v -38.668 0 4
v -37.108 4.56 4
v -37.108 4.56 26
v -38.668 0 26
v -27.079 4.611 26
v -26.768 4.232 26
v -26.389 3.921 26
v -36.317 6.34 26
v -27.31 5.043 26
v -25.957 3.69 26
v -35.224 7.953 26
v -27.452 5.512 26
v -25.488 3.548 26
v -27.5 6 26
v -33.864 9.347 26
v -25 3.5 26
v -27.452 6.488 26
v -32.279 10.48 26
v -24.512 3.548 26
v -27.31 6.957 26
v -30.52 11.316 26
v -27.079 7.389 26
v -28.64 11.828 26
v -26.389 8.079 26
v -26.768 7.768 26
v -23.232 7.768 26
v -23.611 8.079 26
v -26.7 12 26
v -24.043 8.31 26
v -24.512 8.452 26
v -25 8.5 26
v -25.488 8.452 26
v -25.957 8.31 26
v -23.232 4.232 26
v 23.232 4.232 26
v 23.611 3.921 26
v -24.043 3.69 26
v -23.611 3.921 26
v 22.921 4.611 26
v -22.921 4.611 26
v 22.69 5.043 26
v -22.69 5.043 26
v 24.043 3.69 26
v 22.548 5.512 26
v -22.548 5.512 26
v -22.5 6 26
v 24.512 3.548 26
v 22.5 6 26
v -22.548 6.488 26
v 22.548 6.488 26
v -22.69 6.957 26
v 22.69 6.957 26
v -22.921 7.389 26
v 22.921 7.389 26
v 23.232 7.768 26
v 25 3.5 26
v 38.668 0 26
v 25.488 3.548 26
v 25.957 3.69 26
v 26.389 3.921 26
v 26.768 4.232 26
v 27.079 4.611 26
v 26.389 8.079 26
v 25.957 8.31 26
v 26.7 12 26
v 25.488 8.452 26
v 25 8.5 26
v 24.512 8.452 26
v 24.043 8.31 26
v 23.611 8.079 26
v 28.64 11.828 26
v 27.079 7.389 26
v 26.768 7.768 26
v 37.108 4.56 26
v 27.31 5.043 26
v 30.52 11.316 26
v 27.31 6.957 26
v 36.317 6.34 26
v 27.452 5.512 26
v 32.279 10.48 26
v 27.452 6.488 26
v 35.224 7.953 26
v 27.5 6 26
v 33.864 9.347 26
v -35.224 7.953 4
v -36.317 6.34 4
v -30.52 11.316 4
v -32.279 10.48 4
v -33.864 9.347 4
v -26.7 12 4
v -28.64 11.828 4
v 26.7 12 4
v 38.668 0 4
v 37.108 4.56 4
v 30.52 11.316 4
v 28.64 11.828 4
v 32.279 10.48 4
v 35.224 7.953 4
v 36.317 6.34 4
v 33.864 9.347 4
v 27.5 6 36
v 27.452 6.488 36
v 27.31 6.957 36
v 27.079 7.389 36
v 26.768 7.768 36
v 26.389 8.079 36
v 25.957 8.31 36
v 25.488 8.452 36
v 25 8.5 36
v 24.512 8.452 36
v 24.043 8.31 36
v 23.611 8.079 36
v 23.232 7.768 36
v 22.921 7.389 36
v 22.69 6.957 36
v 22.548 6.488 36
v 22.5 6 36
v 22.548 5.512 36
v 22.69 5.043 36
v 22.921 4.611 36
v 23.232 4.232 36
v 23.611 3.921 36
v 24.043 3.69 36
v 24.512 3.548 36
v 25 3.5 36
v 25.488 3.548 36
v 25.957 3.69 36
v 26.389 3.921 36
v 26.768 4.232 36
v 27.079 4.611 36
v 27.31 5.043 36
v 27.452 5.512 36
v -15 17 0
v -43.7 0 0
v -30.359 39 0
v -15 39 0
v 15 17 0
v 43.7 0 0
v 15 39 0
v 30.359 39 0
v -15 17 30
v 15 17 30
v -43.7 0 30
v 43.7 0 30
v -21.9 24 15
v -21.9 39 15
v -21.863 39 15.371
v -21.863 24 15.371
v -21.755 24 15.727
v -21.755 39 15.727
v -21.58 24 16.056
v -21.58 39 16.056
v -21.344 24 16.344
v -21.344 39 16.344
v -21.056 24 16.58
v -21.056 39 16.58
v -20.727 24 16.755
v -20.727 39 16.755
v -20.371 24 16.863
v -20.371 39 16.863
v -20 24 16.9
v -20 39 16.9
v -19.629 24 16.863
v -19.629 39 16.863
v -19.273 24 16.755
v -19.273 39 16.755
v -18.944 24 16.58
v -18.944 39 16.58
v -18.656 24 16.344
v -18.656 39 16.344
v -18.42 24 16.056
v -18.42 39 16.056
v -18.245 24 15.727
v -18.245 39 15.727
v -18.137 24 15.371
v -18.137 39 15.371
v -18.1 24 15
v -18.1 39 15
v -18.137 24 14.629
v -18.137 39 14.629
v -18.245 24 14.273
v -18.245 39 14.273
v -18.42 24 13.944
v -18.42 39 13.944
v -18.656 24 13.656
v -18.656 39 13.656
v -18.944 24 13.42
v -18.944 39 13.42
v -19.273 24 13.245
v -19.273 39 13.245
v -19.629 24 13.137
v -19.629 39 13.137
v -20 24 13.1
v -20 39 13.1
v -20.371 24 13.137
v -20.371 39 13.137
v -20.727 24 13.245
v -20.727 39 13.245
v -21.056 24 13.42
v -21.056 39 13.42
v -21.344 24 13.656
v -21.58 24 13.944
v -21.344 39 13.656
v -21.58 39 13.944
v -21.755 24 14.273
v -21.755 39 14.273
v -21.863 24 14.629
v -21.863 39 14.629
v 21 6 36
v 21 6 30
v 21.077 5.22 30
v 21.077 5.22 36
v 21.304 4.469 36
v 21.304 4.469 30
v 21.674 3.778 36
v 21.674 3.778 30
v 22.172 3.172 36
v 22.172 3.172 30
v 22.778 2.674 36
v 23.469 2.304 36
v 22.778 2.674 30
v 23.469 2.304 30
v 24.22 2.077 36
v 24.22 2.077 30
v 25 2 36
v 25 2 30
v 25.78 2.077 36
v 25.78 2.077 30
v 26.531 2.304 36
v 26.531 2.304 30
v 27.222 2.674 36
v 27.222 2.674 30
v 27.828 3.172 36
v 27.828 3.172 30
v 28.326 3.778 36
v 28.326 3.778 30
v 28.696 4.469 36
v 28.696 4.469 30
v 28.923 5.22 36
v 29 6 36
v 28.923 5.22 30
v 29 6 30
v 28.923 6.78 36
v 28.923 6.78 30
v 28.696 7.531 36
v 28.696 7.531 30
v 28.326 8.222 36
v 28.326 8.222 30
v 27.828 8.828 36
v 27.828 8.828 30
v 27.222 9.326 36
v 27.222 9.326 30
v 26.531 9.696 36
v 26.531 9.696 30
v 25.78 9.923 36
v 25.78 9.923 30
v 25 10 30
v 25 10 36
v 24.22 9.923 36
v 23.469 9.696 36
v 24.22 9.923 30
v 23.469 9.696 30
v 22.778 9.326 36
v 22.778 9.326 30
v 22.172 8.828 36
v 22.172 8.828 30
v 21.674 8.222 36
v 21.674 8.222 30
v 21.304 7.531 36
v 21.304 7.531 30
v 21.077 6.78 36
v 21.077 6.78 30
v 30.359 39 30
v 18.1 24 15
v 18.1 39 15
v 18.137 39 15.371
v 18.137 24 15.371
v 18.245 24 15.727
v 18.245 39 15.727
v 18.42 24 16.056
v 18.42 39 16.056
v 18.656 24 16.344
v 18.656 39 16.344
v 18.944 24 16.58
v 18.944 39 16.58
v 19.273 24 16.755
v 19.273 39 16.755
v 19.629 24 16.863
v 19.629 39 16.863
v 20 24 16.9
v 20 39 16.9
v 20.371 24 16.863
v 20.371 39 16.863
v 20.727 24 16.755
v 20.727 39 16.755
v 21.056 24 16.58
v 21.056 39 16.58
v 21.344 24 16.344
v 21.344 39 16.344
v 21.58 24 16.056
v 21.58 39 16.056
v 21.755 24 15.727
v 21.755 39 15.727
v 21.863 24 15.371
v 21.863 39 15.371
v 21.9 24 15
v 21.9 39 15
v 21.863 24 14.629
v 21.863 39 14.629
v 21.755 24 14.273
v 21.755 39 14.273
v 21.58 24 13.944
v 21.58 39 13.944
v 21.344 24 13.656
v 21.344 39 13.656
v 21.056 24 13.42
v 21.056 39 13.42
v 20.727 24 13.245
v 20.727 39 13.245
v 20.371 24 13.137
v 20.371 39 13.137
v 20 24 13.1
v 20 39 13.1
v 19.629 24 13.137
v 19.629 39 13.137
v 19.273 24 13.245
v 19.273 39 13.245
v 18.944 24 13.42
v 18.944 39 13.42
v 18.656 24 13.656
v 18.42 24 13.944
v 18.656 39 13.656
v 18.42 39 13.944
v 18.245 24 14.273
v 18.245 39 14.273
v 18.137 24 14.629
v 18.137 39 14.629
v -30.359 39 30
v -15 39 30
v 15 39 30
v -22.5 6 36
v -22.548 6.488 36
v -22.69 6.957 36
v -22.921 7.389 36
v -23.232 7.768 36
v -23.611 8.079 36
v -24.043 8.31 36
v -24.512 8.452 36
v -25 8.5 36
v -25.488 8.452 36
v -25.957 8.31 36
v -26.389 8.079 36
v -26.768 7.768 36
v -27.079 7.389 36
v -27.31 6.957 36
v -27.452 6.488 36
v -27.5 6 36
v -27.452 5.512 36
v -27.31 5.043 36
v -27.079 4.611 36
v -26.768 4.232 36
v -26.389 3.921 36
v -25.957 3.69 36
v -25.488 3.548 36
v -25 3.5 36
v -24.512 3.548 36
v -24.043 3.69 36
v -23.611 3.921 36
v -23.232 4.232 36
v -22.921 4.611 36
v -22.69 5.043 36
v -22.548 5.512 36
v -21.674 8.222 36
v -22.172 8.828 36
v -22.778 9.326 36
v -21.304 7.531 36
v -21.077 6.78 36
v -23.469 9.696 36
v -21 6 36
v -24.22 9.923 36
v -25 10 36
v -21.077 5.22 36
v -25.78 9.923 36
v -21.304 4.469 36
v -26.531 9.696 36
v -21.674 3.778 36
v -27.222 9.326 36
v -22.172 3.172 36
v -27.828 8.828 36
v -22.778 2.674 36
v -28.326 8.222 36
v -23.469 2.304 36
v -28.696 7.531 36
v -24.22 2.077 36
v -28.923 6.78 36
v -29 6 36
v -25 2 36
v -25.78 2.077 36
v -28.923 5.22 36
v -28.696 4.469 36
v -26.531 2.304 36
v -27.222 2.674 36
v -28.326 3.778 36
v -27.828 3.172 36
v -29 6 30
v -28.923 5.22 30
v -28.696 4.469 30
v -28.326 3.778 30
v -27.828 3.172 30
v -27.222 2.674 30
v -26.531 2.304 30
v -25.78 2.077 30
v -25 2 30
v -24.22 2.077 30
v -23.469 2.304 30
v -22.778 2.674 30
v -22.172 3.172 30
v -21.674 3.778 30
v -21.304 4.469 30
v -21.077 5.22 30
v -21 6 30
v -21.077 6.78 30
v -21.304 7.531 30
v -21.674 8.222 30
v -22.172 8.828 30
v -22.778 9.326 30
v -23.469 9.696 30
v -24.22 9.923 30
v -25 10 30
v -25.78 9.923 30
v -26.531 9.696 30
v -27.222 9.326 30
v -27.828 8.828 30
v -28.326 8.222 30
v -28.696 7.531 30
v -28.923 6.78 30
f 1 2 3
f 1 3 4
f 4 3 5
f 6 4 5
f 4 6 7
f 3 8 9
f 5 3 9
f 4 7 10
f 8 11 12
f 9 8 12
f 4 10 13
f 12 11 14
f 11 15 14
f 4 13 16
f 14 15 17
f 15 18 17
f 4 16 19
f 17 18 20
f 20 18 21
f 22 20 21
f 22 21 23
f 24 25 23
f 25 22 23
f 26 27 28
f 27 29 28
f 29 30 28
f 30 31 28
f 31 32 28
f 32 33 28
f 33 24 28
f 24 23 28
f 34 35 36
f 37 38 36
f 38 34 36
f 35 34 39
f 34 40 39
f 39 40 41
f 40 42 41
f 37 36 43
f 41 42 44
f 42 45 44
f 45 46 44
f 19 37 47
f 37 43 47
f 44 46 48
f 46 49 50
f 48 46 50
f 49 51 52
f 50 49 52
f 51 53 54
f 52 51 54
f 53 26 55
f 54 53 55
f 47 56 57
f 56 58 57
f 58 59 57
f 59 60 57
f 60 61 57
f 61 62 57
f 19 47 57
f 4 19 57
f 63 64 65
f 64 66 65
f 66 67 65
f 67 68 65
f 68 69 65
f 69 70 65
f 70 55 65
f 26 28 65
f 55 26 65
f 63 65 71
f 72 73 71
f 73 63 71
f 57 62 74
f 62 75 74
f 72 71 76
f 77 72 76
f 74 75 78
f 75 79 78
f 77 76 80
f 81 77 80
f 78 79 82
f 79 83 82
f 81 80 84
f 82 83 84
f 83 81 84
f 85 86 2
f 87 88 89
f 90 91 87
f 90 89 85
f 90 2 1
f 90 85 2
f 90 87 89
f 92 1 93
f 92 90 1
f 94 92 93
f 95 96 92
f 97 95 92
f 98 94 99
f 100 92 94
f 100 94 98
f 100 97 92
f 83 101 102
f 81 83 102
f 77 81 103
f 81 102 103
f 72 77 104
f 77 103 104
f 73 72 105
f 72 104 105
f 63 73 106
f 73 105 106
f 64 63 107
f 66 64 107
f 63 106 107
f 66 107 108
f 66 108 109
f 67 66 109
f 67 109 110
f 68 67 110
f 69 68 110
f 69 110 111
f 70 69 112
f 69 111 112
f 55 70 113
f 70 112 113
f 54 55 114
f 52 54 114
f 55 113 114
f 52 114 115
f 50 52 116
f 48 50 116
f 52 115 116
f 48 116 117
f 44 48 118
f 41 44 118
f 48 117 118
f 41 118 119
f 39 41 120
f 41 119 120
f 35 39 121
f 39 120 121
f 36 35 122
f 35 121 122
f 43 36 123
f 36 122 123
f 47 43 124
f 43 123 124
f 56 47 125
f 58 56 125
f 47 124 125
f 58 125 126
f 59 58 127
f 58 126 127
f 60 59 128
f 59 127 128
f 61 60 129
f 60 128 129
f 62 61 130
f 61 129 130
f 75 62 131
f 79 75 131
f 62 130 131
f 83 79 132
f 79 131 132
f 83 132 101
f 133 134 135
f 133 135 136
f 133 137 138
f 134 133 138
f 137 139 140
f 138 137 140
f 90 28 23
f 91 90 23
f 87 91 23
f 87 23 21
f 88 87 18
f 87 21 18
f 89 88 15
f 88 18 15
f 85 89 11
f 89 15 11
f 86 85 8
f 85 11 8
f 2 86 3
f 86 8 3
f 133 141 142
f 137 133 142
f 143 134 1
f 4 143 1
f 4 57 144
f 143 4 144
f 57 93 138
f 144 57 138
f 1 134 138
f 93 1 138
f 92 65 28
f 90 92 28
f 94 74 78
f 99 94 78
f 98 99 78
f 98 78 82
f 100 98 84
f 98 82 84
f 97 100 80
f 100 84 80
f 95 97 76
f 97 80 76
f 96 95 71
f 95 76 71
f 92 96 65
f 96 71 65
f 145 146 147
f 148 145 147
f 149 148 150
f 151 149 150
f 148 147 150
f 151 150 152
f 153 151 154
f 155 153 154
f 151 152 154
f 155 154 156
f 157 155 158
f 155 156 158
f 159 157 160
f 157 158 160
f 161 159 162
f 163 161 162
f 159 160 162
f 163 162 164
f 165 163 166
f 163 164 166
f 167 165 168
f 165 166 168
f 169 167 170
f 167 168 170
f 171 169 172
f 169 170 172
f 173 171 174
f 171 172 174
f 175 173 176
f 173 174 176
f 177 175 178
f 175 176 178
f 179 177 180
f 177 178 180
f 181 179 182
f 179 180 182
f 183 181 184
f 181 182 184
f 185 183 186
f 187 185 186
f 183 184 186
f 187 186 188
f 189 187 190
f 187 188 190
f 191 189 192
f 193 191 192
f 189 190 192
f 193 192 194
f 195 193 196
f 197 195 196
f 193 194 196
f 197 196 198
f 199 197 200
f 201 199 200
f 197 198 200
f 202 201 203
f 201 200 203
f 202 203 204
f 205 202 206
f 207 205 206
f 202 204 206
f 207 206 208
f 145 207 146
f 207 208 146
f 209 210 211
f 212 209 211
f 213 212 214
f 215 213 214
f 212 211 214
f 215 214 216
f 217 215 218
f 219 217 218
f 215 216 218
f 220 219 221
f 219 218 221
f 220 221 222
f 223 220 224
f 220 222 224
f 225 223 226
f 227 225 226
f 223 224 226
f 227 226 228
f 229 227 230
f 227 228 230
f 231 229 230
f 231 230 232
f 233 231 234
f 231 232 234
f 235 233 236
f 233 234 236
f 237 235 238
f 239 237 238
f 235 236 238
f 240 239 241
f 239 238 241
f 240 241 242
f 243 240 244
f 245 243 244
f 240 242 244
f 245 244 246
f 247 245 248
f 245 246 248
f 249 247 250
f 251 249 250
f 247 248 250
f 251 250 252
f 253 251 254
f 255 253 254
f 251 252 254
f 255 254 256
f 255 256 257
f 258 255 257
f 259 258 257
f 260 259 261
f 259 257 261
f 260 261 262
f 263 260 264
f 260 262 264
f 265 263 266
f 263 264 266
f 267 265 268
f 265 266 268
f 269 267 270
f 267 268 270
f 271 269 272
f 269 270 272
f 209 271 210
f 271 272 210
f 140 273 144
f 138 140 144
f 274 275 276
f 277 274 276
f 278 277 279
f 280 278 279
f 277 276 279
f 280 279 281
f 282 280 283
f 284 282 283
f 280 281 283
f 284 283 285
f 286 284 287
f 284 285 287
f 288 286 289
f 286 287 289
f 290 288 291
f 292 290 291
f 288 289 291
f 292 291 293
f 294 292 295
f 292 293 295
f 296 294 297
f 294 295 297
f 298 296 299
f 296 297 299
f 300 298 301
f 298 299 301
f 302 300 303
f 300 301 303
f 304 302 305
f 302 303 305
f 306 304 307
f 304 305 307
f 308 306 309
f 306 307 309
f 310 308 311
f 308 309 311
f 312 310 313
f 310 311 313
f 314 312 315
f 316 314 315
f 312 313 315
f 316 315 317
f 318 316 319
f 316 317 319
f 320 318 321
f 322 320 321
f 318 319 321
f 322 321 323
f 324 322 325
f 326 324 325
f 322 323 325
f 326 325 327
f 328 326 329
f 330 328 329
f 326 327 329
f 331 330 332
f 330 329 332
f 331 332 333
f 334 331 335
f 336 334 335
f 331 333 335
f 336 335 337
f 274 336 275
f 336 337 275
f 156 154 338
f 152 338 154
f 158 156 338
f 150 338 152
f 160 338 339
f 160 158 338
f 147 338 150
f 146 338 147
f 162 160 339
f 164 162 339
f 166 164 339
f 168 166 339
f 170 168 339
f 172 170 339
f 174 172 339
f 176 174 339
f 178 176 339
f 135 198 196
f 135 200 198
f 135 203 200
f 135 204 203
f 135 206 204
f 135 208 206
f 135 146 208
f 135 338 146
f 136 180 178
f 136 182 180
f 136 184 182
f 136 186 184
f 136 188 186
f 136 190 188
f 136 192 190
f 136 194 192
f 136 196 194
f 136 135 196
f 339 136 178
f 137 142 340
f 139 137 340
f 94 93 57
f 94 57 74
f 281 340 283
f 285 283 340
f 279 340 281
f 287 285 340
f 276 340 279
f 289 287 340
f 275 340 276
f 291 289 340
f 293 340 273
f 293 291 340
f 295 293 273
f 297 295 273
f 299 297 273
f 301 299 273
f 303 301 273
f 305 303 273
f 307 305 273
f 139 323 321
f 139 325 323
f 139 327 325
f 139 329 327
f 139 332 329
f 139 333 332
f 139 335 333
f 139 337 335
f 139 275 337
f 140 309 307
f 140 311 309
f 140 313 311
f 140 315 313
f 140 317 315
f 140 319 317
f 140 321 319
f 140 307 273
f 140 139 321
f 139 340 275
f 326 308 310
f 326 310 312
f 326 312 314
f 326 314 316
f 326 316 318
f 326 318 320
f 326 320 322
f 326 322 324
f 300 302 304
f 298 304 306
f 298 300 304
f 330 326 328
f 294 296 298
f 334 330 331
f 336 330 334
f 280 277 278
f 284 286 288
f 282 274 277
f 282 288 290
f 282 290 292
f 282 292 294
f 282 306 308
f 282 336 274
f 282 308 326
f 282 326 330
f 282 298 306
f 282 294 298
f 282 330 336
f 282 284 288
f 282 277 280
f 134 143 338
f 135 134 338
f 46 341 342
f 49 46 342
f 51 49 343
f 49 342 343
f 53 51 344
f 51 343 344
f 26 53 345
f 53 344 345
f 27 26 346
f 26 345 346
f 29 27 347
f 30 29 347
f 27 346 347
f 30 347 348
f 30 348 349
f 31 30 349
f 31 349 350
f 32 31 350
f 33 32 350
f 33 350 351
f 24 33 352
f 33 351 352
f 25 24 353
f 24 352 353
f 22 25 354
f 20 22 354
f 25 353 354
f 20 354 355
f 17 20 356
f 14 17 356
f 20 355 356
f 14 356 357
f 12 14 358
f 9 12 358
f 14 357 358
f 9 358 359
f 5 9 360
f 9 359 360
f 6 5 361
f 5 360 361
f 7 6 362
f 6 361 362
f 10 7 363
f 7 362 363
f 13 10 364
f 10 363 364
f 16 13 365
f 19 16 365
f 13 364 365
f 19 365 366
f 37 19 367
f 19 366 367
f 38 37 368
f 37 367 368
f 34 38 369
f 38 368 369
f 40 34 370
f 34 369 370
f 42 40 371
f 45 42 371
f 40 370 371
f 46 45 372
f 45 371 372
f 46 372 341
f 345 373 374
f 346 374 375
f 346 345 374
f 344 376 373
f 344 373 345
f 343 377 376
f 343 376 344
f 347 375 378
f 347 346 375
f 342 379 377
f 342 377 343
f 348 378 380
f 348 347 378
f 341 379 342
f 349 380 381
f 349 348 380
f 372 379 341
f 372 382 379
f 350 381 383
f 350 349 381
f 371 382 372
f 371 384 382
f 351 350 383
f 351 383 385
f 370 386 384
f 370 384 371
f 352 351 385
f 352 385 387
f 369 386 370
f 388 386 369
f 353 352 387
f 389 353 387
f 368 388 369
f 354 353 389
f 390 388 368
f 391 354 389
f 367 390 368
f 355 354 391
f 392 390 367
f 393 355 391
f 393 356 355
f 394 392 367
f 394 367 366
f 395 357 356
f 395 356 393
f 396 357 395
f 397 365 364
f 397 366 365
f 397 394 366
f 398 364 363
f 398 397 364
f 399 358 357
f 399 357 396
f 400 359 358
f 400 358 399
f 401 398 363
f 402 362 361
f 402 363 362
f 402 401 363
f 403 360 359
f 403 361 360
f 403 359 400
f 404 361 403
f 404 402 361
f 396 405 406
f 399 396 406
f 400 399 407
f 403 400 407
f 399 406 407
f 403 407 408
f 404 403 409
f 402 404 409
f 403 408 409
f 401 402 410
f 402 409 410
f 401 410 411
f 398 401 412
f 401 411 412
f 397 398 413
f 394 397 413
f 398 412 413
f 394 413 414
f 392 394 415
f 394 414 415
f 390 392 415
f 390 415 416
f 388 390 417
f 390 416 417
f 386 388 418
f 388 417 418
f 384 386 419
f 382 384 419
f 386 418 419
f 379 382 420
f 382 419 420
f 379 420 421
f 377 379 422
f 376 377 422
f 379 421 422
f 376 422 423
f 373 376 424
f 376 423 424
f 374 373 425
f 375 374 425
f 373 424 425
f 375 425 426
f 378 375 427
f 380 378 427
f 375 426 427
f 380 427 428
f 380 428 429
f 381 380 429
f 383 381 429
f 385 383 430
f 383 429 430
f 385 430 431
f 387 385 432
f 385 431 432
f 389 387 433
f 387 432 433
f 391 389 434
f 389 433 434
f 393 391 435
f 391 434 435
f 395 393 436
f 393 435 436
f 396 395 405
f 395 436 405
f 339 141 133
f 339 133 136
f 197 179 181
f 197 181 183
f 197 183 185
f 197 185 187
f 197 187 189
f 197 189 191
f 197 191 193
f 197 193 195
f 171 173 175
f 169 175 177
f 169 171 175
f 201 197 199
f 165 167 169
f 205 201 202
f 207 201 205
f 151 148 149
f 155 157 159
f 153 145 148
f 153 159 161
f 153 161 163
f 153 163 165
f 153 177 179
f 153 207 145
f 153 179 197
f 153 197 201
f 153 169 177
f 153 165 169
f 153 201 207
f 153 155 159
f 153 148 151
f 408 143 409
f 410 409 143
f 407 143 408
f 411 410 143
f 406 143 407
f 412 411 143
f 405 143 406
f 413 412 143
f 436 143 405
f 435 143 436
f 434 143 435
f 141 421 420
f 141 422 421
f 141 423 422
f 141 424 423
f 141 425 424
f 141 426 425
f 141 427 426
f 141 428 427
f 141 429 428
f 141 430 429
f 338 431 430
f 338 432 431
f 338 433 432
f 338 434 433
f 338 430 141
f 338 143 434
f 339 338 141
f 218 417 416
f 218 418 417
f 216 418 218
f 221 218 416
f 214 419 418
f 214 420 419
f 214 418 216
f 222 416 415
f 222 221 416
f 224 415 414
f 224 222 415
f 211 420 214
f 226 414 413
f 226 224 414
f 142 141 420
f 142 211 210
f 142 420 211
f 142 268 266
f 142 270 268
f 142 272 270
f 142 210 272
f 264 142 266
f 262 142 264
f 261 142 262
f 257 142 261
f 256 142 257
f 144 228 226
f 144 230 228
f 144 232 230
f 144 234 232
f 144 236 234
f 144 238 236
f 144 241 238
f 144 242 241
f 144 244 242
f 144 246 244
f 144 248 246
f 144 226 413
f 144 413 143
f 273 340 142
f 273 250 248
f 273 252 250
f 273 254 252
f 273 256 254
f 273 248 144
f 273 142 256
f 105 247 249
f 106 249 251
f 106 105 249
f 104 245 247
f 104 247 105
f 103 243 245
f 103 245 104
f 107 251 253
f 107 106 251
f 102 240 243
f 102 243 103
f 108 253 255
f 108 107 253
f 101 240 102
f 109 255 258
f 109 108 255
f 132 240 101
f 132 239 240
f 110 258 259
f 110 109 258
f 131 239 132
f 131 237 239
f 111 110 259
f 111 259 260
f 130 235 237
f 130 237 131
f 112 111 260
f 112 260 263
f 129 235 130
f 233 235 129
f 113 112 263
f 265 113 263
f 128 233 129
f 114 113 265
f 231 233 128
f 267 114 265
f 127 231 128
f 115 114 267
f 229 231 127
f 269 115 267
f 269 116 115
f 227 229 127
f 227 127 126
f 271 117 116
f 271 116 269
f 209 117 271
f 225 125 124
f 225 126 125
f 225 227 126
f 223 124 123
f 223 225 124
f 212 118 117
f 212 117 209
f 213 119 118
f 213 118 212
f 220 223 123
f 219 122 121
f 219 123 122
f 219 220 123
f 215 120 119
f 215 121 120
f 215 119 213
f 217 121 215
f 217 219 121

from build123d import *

# Parameters (mm, degrees)
SKETCH1_W           = 87.4
SKETCH1_H           = 39
BOSS_EXTRUDE1_DEPTH = 30
CUT_EXTRUDE1_START  = -4
CUT_EXTRUDE1_DEPTH  = 22
SKETCH3_W           = 30
SKETCH3_H           = 22
CUT_EXTRUDE2_DEPTH  = 66.80797824
SKETCH4_R           = 1.9
CUT_EXTRUDE3_DEPTH  = 15
SKETCH5_R           = 4
BOSS_EXTRUDE2_DEPTH = 6
SKETCH6_R           = 2.5
CUT_EXTRUDE4_DEPTH  = 10


with BuildPart() as part:
    # Sketch1 → Boss-Extrude1 (new body)
    with BuildSketch(Plane.XY):
        with Locations((0, 19.5)):
            Rectangle(SKETCH1_W, SKETCH1_H)
    extrude(amount=BOSS_EXTRUDE1_DEPTH)

    # Sketch2 → Cut-Extrude1 (cut)
    with BuildSketch(Plane.XY.offset(30).offset(CUT_EXTRUDE1_START)):
        with BuildLine():
            Line((-38.667900264, 0), (38.667900264, 0))
            Line((38.667900264, 0), (37.107871406, 4.560366948))
            ThreePointArc((37.107871406, 4.560366948), (33.096716485, 9.948855693), (26.7, 12))
            Line((26.7, 12), (-26.7, 12))
            ThreePointArc((-26.7, 12), (-33.096716485, 9.948855693), (-37.107871406, 4.560366948))
            Line((-37.107871406, 4.560366948), (-38.667900264, 0))
        make_face()
    extrude(amount=-CUT_EXTRUDE1_DEPTH, mode=Mode.SUBTRACT)

    # Sketch3 → Cut-Extrude2 (cut, through all)
    with BuildSketch(Plane.XY.offset(30)):
        Polygon((-43.7, 0), (-30.358721505, 39), (-43.7, 39), align=None)
        with Locations((0, 28)):
            Rectangle(SKETCH3_W, SKETCH3_H)
        Polygon((30.358721505, 39), (43.7, 0), (43.7, 39), align=None)
    extrude(amount=-CUT_EXTRUDE2_DEPTH, mode=Mode.SUBTRACT)

    # Sketch4 → Cut-Extrude3 (cut)
    with BuildSketch(Plane(origin=(0, 39, 0), x_dir=(1, 0, 0), z_dir=(0, 1, 0))):
        with Locations(Location((-20, -15, 0), (0, 0, 180))):
            Circle(SKETCH4_R)
        with Locations(Location((20, -15, 0), (0, 0, 180))):
            Circle(SKETCH4_R)
    extrude(amount=-CUT_EXTRUDE3_DEPTH, mode=Mode.SUBTRACT)

    # Sketch5 → Boss-Extrude2 (add)
    with BuildSketch(Plane.XY.offset(30)):
        with Locations(Location((25, 6, 0), (0, 0, 180))):
            Circle(SKETCH5_R)
        with Locations(Location((-25, 6, 0), (0, 0, 180))):
            Circle(SKETCH5_R)
    extrude(amount=BOSS_EXTRUDE2_DEPTH)

    # Sketch6 → Cut-Extrude4 (cut)
    with BuildSketch(Plane.XY.offset(36)):
        with Locations((25, 6)):
            Circle(SKETCH6_R)
        with Locations((-25, 6)):
            Circle(SKETCH6_R)
    extrude(amount=-CUT_EXTRUDE4_DEPTH, mode=Mode.SUBTRACT)


solid = part.part
